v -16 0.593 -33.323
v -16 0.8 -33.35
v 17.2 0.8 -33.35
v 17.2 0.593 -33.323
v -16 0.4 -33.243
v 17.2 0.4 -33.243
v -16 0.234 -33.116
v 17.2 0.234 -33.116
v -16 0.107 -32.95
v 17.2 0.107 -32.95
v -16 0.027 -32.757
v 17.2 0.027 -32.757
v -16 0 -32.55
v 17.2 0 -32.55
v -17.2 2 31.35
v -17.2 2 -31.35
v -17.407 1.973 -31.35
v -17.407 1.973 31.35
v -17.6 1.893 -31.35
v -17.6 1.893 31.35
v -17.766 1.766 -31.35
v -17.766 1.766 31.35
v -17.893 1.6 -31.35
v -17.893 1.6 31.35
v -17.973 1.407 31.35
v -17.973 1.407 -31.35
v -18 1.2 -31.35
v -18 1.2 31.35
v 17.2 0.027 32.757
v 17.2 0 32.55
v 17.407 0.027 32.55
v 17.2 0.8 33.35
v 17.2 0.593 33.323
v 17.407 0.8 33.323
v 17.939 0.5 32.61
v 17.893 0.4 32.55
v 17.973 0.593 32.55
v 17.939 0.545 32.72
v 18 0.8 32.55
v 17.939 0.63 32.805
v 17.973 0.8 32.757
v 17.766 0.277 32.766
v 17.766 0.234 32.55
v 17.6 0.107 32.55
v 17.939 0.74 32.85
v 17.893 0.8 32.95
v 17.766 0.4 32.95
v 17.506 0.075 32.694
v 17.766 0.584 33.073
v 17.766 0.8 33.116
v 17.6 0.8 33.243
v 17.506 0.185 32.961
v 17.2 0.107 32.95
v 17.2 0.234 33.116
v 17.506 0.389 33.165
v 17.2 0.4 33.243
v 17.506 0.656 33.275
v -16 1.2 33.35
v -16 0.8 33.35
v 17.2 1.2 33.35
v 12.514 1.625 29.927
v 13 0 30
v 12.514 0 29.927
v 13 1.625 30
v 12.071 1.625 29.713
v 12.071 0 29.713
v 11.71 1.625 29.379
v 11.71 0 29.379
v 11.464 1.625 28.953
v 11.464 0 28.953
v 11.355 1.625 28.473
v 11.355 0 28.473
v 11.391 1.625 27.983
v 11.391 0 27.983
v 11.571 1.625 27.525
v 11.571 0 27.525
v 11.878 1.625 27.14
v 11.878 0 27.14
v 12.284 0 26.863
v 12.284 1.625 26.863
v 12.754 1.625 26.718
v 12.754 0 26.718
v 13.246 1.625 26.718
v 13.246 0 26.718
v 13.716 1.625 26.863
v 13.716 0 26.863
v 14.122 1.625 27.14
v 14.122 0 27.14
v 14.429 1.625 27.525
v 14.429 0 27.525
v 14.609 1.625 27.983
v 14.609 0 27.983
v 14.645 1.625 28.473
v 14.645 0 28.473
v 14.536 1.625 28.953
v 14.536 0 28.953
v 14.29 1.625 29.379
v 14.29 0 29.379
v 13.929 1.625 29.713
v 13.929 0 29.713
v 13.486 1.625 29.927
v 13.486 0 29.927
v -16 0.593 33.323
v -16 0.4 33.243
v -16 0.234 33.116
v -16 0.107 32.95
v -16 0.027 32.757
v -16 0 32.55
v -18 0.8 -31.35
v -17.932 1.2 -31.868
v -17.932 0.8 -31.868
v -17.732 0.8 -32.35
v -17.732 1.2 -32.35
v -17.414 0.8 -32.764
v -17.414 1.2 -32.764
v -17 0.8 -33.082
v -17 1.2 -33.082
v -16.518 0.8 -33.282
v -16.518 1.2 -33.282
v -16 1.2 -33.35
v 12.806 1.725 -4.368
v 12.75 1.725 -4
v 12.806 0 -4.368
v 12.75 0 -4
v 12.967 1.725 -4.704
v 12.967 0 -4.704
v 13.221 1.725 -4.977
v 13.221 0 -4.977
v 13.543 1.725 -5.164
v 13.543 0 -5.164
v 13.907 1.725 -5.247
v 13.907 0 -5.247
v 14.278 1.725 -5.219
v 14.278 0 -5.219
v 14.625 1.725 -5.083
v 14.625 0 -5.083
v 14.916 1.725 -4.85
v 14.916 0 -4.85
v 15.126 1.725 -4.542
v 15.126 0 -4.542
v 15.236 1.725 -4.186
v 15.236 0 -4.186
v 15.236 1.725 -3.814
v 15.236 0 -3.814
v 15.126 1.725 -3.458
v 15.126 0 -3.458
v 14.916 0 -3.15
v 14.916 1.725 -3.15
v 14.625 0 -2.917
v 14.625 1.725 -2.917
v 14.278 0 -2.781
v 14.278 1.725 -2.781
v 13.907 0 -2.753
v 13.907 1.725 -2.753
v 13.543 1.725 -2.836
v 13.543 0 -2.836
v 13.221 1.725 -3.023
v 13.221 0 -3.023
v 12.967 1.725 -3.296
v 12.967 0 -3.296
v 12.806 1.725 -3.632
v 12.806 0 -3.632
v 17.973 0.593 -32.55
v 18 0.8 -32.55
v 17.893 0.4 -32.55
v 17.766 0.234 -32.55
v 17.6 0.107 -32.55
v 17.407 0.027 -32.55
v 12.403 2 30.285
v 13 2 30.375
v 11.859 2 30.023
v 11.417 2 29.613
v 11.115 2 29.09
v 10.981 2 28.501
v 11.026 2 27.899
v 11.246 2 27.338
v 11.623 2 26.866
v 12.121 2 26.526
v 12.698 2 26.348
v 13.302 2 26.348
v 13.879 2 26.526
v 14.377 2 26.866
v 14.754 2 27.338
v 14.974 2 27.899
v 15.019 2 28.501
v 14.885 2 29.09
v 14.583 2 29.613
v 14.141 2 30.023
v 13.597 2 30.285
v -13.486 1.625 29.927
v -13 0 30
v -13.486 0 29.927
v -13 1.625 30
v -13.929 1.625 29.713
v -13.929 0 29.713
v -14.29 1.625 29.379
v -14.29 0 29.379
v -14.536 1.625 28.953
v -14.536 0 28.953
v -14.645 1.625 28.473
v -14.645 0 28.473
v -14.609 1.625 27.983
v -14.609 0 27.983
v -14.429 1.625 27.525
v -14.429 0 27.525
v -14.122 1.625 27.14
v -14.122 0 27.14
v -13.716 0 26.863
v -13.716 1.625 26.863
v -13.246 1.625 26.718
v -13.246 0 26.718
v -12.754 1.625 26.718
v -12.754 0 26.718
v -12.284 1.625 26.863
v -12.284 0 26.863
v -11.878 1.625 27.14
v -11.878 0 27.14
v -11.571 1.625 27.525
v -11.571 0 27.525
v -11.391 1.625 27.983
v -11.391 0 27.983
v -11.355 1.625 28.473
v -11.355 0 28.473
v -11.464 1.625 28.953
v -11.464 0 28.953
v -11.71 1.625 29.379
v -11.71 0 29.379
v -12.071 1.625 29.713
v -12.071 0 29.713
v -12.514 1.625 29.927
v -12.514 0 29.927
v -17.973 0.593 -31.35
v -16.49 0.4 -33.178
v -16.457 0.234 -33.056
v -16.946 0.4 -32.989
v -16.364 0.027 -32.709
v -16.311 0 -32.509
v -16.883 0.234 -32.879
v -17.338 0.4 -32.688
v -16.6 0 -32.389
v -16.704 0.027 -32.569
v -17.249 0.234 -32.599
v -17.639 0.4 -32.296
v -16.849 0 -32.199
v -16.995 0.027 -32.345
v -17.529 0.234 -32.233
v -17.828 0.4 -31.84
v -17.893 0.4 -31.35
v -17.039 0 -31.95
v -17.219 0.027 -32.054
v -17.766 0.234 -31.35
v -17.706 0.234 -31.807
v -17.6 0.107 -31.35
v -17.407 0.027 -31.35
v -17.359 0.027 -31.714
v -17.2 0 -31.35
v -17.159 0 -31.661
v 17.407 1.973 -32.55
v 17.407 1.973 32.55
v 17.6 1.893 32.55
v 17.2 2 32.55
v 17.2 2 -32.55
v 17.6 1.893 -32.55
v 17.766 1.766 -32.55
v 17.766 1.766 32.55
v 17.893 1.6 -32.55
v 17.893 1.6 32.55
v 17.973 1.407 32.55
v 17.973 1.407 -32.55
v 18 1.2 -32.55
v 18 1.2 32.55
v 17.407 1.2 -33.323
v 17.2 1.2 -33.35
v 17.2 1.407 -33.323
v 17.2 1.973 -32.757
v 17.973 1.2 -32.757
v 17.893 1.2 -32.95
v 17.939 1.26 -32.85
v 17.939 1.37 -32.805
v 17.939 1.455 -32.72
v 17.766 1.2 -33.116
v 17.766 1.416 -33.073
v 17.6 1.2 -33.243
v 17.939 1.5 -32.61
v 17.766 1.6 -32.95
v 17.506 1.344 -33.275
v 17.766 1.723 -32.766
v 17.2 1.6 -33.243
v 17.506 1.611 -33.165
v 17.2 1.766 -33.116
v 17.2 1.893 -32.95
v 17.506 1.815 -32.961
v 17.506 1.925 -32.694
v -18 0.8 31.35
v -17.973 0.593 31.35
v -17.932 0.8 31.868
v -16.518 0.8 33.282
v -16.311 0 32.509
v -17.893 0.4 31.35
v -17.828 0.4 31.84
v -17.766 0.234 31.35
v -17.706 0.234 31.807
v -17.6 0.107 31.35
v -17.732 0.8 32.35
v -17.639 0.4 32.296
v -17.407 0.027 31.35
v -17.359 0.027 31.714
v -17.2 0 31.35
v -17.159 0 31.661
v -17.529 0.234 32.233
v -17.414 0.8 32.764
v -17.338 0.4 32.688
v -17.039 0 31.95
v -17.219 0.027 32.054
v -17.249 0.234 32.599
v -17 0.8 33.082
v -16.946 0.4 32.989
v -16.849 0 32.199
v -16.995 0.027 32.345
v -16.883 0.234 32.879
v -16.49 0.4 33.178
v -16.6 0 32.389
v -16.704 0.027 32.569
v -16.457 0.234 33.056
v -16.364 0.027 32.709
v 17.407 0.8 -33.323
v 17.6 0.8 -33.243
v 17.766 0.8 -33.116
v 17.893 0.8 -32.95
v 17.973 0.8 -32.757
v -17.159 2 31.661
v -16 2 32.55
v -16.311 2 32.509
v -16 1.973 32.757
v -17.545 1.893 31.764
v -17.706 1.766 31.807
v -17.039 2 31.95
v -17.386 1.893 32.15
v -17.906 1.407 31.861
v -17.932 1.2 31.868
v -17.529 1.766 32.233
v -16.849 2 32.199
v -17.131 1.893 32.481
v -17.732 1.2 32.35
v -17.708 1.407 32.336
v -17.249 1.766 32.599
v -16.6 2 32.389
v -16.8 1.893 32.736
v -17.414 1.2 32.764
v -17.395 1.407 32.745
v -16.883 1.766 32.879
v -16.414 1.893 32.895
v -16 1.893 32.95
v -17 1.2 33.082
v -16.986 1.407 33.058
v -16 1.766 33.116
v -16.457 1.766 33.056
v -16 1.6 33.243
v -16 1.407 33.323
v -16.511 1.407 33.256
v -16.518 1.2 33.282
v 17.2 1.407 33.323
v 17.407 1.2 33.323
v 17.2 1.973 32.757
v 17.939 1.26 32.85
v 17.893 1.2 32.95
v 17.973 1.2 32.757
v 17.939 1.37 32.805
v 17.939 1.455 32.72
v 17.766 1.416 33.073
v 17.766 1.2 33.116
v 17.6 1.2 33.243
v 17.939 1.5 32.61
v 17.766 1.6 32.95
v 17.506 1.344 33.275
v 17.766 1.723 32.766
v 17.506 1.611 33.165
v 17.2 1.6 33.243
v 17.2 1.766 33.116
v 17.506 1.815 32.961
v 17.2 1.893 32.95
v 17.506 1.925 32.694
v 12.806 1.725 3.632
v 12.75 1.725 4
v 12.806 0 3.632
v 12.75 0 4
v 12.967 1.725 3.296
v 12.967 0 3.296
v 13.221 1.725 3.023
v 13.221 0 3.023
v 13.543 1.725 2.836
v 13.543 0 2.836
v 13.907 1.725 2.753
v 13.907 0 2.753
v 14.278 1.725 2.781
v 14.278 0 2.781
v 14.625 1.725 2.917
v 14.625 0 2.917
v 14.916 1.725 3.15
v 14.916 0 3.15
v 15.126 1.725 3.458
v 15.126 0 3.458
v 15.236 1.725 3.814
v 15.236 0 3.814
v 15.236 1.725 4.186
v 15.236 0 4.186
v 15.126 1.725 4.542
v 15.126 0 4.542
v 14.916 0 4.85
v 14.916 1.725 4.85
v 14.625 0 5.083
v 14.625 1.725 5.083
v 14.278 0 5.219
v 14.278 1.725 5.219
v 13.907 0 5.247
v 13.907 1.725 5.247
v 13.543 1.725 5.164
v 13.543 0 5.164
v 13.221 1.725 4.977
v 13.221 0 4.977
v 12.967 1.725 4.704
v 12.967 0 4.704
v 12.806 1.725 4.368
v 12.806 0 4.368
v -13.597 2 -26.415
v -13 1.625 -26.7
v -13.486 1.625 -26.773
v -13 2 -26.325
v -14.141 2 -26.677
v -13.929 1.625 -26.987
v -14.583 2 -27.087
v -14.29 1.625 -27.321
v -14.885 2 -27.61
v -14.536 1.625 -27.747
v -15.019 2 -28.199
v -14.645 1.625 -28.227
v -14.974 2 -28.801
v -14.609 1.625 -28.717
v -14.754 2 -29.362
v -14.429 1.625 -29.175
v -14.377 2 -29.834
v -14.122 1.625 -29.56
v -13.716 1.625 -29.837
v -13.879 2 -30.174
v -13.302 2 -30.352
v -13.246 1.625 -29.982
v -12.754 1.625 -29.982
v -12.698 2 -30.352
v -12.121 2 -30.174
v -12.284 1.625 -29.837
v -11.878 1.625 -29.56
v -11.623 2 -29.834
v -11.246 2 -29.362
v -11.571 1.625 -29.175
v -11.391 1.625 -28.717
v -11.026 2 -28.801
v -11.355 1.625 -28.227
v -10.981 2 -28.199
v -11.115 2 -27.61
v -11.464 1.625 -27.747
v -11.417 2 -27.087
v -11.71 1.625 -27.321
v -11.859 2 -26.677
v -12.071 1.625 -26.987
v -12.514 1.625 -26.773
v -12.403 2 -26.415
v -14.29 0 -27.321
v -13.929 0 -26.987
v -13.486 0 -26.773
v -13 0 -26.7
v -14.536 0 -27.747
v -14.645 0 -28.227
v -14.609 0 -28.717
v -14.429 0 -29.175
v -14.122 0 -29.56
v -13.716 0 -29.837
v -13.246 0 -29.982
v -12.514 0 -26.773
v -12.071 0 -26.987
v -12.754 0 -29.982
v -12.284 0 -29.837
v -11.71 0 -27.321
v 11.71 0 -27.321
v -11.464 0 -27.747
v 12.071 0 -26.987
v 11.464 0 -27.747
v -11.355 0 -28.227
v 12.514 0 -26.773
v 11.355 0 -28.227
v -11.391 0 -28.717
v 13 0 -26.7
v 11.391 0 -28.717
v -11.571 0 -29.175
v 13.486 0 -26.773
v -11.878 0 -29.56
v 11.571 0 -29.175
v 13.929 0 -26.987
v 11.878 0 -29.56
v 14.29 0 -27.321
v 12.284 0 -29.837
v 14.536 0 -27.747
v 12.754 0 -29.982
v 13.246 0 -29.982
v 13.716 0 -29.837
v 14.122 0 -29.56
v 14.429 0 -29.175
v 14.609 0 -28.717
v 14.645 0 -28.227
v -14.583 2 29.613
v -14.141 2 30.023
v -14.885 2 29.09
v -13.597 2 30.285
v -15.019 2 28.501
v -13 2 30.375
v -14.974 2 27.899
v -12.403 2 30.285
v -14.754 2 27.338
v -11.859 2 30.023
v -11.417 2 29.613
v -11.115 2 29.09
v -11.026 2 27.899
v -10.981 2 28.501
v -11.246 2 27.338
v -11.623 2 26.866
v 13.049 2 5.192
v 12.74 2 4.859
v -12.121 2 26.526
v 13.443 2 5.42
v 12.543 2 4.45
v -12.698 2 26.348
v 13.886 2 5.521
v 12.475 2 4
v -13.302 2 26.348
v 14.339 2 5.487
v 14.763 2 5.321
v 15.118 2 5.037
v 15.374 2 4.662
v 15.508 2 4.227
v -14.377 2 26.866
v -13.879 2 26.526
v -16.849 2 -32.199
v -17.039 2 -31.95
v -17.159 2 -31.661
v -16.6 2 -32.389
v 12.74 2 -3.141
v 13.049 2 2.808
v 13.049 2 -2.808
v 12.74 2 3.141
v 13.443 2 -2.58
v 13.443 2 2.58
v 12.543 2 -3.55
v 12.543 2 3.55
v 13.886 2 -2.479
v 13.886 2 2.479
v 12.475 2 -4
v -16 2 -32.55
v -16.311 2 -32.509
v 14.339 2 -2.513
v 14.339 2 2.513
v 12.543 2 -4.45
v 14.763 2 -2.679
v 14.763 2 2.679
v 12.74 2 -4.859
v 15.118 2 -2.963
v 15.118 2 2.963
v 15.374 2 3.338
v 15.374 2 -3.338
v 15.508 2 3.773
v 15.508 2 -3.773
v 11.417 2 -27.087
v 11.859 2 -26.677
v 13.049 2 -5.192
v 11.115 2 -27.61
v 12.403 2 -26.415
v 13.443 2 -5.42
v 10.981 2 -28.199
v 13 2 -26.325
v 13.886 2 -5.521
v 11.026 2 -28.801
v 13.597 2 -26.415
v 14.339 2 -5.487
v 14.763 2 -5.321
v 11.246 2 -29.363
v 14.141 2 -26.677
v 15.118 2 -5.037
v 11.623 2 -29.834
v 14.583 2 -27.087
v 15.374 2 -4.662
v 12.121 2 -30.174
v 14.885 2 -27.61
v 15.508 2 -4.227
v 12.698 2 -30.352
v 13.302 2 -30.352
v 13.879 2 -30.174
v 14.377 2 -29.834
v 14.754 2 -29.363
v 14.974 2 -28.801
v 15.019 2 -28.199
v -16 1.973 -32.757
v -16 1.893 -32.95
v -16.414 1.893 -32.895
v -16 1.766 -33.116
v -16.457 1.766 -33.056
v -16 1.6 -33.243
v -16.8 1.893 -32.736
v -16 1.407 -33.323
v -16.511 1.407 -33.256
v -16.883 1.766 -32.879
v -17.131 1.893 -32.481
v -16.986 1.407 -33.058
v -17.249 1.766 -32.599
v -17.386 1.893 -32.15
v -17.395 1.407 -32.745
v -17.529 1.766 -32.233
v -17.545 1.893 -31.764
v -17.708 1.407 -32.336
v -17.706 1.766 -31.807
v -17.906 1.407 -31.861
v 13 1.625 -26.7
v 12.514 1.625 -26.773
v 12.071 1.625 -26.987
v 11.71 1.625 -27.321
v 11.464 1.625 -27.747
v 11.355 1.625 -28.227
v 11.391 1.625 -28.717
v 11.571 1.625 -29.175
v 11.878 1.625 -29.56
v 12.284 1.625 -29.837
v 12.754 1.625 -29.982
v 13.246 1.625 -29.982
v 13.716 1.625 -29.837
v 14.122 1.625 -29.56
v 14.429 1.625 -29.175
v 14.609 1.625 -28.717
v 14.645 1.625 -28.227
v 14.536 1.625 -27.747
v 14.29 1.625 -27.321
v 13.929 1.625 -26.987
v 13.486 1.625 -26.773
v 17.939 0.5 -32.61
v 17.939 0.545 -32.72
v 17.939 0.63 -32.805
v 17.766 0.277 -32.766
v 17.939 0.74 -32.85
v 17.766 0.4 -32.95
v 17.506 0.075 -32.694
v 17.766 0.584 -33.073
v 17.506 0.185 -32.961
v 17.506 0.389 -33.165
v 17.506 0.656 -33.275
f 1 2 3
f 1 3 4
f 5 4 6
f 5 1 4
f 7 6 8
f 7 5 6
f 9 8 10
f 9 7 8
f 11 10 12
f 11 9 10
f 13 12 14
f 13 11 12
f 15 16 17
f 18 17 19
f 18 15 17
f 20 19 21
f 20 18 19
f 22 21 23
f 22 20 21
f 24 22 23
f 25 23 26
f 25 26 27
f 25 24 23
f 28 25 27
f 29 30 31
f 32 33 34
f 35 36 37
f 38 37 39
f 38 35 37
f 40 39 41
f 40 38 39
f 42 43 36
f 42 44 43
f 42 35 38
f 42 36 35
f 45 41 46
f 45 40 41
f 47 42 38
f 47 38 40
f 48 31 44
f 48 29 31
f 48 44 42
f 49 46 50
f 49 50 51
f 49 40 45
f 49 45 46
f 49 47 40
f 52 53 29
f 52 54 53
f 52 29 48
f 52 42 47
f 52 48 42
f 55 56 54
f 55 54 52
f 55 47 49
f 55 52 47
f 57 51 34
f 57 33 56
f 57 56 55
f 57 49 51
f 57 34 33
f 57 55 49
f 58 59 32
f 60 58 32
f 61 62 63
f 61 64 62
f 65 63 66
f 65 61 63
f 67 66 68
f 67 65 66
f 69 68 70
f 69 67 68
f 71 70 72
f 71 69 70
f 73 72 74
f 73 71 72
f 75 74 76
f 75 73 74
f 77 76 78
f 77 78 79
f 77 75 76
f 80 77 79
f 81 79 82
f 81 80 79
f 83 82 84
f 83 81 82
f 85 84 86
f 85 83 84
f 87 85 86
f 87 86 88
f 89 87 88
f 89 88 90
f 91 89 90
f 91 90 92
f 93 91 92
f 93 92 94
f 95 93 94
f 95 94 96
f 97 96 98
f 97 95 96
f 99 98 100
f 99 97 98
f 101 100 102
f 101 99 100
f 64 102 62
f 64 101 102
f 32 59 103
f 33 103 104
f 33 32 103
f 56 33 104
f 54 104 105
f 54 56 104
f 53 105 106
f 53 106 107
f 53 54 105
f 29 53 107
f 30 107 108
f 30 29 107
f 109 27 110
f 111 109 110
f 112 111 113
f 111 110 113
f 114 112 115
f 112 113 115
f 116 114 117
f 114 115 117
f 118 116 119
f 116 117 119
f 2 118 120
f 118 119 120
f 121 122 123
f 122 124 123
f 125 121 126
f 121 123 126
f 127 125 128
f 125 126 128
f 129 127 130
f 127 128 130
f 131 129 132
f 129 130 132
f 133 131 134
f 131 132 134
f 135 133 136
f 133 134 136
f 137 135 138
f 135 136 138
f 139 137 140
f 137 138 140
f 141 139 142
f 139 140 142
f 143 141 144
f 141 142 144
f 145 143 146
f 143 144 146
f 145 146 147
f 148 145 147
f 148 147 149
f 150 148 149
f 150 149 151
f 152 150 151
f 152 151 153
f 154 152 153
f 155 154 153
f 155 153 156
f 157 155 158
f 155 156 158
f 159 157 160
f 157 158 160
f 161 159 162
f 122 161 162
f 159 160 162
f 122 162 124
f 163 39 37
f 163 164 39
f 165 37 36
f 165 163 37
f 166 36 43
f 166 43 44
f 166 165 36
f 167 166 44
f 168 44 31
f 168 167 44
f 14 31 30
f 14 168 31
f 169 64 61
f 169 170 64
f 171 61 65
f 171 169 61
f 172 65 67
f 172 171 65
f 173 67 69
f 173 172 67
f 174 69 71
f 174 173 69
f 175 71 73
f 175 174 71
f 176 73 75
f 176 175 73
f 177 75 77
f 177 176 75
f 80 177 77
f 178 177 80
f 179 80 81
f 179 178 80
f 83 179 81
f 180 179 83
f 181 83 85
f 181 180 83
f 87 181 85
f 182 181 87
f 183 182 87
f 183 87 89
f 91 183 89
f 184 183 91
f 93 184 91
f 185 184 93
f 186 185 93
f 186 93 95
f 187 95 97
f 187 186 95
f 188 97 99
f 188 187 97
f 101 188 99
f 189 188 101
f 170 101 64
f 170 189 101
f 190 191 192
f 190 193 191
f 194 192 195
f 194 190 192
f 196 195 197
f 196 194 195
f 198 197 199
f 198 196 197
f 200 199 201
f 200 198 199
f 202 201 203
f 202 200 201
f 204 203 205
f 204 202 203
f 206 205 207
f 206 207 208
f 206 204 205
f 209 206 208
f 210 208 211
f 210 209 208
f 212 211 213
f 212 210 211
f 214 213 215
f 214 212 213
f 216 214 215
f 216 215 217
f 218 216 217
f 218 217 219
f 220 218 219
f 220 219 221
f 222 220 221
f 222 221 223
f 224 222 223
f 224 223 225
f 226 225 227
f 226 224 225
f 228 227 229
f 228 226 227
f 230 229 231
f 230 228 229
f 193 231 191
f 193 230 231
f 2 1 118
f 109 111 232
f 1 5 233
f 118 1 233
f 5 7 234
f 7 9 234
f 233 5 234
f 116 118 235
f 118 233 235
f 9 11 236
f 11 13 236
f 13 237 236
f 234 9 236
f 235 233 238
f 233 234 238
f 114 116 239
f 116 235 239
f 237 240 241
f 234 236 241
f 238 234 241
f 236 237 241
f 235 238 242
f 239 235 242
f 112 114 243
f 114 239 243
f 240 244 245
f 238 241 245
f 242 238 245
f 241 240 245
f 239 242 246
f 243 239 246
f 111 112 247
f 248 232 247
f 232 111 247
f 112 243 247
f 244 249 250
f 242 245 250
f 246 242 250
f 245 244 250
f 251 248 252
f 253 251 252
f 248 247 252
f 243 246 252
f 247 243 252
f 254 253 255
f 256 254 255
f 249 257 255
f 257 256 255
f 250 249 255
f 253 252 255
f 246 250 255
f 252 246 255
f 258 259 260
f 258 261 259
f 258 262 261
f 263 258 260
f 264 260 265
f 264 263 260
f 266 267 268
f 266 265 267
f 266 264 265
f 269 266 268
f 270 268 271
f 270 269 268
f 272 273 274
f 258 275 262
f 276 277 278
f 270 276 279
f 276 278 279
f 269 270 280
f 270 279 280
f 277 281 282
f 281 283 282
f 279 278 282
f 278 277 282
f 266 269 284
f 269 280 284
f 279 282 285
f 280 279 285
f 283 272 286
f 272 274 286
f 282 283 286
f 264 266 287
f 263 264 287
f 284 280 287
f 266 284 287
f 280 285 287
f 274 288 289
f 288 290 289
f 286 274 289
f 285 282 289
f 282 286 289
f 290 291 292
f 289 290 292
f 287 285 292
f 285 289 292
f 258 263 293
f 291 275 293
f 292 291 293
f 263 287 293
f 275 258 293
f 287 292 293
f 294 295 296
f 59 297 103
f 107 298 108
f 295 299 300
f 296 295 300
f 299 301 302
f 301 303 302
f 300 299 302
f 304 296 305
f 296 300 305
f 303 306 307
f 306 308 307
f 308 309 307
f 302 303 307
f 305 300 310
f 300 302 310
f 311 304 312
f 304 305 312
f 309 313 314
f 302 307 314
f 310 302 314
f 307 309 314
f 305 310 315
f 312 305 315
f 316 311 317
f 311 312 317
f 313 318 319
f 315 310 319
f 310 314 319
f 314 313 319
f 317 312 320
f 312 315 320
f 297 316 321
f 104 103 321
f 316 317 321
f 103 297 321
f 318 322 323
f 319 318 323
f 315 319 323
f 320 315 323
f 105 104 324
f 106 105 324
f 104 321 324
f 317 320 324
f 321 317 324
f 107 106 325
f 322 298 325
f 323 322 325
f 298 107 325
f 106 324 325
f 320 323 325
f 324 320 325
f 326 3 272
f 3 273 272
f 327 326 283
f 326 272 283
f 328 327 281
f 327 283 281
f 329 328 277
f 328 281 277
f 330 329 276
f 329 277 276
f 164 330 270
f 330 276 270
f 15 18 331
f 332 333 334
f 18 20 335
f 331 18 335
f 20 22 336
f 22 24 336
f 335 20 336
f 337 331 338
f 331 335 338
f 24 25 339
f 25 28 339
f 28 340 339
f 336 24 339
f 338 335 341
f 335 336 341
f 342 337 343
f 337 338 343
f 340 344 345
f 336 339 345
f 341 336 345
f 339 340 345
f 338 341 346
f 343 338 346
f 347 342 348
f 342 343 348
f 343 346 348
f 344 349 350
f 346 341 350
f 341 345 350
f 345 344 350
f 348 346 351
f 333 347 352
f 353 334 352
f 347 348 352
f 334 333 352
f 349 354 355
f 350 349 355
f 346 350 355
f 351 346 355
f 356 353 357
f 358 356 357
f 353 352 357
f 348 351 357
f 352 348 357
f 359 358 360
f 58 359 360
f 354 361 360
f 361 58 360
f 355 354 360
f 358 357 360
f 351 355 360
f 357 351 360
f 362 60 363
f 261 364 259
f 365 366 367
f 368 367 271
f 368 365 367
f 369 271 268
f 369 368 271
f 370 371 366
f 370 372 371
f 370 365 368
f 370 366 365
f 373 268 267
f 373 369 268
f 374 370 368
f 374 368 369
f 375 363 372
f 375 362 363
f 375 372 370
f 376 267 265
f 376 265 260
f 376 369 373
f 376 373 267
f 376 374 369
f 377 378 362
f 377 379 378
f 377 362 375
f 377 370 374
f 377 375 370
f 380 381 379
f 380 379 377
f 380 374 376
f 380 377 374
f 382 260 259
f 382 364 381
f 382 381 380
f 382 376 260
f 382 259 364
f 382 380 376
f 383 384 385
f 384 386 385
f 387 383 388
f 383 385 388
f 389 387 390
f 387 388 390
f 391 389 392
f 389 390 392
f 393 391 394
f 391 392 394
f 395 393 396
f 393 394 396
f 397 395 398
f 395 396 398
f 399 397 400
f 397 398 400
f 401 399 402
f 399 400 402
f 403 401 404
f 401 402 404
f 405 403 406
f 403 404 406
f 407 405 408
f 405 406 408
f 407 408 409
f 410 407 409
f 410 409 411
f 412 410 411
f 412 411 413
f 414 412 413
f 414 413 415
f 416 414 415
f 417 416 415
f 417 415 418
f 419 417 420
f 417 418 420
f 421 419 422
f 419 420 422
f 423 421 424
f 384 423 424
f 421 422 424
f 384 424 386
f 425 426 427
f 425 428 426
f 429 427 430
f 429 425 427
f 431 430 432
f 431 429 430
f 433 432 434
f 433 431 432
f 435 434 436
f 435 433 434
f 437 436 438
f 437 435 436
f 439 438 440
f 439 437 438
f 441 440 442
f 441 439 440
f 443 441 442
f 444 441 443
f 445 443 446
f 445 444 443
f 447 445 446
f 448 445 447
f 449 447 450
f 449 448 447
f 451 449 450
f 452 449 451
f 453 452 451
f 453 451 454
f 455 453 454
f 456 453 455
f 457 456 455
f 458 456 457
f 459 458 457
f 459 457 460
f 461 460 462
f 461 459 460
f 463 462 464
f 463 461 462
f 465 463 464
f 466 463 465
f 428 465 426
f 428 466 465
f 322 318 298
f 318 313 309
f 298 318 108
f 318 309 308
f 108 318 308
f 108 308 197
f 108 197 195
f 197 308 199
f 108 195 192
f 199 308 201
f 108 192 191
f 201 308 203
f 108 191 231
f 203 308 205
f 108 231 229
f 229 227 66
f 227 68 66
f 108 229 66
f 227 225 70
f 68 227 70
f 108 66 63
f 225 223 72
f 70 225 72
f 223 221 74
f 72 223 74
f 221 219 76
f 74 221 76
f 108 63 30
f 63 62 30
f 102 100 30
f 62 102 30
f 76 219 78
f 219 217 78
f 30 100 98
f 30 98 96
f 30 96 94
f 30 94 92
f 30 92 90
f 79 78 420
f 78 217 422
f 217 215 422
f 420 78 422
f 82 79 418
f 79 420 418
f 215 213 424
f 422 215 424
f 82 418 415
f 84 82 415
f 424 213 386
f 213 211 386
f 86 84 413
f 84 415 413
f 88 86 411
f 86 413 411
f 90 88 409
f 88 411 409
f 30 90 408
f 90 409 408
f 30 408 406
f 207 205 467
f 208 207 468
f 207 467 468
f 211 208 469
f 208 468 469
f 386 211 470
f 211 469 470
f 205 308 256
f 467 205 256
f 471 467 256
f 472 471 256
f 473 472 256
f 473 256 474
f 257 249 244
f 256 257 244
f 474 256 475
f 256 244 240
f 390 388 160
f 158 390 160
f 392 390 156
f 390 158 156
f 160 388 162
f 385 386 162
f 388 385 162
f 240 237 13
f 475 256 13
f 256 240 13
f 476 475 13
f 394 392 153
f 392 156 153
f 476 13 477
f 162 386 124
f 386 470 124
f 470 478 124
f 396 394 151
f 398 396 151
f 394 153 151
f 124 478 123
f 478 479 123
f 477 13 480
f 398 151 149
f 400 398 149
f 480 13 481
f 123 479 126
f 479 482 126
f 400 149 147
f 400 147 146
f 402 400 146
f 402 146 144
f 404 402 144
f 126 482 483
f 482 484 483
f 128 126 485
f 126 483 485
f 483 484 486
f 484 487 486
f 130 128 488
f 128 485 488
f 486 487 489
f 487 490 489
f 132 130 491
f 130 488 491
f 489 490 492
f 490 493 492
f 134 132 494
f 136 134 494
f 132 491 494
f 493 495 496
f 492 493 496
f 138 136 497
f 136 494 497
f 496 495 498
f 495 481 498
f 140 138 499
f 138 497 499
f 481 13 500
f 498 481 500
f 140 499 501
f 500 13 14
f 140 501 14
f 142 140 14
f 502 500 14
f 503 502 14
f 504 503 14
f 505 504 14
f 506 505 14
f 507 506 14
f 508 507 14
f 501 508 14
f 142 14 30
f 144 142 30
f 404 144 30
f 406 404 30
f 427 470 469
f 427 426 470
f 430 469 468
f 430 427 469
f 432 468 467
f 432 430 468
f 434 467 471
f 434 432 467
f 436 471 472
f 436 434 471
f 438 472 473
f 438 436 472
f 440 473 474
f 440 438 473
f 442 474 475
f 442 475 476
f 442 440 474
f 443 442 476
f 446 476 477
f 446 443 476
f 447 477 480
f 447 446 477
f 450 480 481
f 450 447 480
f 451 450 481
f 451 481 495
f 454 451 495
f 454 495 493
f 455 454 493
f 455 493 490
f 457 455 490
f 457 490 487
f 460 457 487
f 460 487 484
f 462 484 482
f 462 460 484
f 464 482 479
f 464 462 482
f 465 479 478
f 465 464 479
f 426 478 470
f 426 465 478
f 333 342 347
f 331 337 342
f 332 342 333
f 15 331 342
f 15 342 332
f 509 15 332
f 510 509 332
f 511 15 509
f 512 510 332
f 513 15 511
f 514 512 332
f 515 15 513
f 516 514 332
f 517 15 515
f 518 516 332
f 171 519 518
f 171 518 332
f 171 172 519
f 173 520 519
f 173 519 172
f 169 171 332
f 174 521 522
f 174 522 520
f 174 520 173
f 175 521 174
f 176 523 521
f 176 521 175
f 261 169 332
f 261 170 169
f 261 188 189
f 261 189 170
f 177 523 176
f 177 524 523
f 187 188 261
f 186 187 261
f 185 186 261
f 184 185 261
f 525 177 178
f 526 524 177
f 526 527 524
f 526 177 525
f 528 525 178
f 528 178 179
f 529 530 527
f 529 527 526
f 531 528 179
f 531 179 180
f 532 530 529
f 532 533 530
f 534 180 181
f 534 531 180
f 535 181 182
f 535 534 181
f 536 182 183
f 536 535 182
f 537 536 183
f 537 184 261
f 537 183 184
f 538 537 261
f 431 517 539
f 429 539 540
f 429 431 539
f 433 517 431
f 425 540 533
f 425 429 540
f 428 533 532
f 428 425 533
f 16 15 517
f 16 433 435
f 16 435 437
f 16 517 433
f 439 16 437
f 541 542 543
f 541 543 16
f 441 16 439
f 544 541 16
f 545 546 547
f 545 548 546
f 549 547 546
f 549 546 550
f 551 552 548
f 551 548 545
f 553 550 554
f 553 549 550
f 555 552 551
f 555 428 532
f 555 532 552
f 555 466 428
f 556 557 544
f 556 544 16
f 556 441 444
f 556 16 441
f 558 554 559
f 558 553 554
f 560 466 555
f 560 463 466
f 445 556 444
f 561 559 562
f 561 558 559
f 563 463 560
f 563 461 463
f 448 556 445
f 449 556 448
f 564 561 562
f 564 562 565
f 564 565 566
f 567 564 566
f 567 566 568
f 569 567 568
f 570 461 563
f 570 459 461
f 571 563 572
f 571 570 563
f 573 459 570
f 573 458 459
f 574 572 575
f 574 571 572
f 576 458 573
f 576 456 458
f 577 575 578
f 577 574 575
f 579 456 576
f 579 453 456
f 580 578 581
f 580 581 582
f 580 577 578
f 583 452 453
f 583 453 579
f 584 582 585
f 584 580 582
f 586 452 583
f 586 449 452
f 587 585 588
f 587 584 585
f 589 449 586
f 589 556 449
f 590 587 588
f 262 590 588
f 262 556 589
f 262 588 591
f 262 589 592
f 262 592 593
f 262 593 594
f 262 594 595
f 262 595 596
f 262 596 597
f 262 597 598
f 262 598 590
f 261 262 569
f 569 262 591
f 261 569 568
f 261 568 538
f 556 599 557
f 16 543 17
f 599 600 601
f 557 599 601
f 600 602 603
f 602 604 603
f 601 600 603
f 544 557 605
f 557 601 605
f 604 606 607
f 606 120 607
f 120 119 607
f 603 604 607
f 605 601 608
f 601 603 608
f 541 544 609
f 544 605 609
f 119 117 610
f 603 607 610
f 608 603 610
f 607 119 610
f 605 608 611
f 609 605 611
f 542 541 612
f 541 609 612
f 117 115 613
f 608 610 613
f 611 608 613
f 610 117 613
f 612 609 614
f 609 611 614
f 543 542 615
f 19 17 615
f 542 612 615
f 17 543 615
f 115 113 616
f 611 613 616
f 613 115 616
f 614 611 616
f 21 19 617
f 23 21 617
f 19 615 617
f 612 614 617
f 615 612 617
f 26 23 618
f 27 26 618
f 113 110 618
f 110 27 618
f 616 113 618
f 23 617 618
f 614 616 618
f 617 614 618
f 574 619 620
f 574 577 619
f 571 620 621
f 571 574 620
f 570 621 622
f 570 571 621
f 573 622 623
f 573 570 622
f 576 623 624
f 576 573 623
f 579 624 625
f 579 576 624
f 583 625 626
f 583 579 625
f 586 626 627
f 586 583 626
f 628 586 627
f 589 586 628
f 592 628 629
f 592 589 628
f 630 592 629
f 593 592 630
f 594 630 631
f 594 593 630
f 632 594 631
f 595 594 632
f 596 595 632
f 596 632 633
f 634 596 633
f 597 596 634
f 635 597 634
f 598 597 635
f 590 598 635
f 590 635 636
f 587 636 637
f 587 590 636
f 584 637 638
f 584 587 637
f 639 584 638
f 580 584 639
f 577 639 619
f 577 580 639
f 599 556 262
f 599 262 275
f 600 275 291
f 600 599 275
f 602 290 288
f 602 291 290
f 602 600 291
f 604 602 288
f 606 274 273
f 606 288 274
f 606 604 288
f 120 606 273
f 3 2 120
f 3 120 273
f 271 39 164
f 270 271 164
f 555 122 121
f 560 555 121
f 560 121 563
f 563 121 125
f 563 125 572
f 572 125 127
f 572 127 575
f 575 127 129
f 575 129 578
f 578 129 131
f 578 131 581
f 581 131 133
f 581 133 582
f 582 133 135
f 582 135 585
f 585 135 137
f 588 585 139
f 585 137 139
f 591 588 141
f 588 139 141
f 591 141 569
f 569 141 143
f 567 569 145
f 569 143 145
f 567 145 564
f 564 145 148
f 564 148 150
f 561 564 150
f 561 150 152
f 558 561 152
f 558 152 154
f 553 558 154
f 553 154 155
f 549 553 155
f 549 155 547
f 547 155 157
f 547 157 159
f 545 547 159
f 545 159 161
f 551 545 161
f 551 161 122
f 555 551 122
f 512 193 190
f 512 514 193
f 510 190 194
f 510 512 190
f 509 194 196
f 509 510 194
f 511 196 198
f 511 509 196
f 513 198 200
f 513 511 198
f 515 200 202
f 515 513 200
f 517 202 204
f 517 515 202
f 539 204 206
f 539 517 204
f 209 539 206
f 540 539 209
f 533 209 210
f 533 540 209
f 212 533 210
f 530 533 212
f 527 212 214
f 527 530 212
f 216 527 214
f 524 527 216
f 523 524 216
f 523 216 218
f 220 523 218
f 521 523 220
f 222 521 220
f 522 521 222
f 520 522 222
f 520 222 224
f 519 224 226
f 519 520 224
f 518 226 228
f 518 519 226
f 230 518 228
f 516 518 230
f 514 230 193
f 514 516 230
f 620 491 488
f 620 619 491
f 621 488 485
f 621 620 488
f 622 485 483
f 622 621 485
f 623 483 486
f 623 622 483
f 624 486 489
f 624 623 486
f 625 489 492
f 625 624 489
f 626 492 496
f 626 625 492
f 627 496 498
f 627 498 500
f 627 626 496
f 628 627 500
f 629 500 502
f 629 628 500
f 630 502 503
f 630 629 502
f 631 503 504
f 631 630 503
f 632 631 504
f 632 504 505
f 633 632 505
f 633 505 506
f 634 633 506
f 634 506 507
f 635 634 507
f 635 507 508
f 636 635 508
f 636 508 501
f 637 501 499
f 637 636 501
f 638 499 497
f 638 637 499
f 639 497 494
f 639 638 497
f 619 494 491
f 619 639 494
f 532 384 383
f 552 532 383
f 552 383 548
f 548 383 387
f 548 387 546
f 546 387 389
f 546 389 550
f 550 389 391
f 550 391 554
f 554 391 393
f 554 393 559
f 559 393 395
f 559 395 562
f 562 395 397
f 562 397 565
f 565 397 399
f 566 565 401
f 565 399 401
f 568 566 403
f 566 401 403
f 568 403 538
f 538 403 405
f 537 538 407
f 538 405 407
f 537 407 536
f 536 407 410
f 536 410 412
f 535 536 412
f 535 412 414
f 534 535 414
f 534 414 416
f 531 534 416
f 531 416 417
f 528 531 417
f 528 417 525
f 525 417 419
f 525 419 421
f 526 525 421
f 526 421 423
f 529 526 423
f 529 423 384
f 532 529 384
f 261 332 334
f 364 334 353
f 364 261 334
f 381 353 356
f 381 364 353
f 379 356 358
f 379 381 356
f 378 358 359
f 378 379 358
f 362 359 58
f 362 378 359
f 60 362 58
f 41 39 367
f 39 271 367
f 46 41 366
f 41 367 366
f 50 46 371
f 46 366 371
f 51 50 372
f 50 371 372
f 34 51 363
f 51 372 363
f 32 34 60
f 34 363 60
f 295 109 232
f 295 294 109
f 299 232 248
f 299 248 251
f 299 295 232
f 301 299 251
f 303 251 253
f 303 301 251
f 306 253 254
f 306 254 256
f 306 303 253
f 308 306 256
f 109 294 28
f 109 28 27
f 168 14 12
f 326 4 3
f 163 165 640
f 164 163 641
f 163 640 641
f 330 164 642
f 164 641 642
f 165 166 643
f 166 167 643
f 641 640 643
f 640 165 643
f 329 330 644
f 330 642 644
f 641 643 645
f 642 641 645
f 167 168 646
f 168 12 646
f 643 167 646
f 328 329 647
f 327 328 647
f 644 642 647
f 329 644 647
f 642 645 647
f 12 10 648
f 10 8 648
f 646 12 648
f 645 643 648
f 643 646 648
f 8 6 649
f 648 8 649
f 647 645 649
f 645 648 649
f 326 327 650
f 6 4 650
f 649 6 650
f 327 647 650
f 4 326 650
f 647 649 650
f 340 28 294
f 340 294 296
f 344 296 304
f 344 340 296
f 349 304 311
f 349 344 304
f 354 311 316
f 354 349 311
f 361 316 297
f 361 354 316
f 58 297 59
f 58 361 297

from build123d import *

# Parameters (mm, degrees)
SKETCH_1_W                   = 36
SKETCH_1_H                   = 66.7
EXTRUDE_1_DEPTH              = 2
HOLE_WIZARD_M4_2_AT_2_COUNT  = 2
HOLE_WIZARD_M4_2_AT_2_PITCH  = 56.7
HOLE_WIZARD_M4_2_AT_3_COUNT  = 2
HOLE_WIZARD_M4_2_AT_3_PITCH  = 62.376998966
HOLE_WIZARD_M4_2_AT_4_COUNT  = 2
HOLE_WIZARD_M4_2_AT_4_PITCH  = 26
FILLET_1_R                   = 2
HOLE_WIZARD_M3_1_D           = 2.5
HOLE_WIZARD_M3_1_CSINK_D     = 3.05
HOLE_WIZARD_M3_1_CSINK_ANGLE = 90
FILLET_2_R                   = 0.8


with BuildPart() as part:
    # 草图1 → 凸台-拉伸1 (new body)
    with BuildSketch(Plane(origin=(0, 0, 0), x_dir=(1, 0, 0), z_dir=(0, 1, 0))):
        Rectangle(SKETCH_1_W, SKETCH_1_H)
    extrude(amount=EXTRUDE_1_DEPTH)

    # 草图4 → M4 螺纹孔2 (revolve, cut)
    with BuildSketch(Plane(origin=(-13, 2, 28.35), x_dir=(0, 0, 1), z_dir=(1, 0, 0))):
        Polygon((0, 0), (0, 2), (1.65, 2), (1.65, 0.375), (2.025, 0), align=None)
    hole_wizard_m4_2 = revolve(axis=Axis((-13, 8.35, 28.35), (0, -1, 0)), mode=Mode.SUBTRACT)

    # M4 螺纹孔2 at 2: M4 螺纹孔2 ×2
    with Locations(*[(0, 0, -i * HOLE_WIZARD_M4_2_AT_2_PITCH) for i in range(1, HOLE_WIZARD_M4_2_AT_2_COUNT)]):
        add(hole_wizard_m4_2, mode=Mode.SUBTRACT)

    # M4 螺纹孔2 at 3: M4 螺纹孔2 ×2
    with Locations(*[Vector(0.41682030926474145, 0, -0.9089889052042635) * (i * HOLE_WIZARD_M4_2_AT_3_PITCH) for i in range(1, HOLE_WIZARD_M4_2_AT_3_COUNT)]):
        add(hole_wizard_m4_2, mode=Mode.SUBTRACT)

    # M4 螺纹孔2 at 4: M4 螺纹孔2 ×2
    with Locations(*[(i * HOLE_WIZARD_M4_2_AT_4_PITCH, 0, 0) for i in range(1, HOLE_WIZARD_M4_2_AT_4_COUNT)]):
        add(hole_wizard_m4_2, mode=Mode.SUBTRACT)

    # 圆角1
    fillet_1_edges = [part.edges().sort_by_distance(p)[0] for p in [
        (-18, 1, 33.35),
        (-18, 1, -33.35),
    ]]
    fillet(fillet_1_edges, radius=FILLET_1_R)

    # M3 螺纹孔1 (through all)
    with Locations(Plane(origin=(0, 2, 0), x_dir=(1, 0, 0), z_dir=(0, 1, 0))):
        with Locations((14, -4), (14, 4)):
            CounterSinkHole(HOLE_WIZARD_M3_1_D / 2, HOLE_WIZARD_M3_1_CSINK_D / 2, counter_sink_angle=HOLE_WIZARD_M3_1_CSINK_ANGLE)

    # 圆角2
    fillet_2_edges = [part.edges().sort_by_distance(p)[0] for p in [
        (1, 0, 33.35),
        (1, 2, 33.35),
        (-18, 0, 0),
        (1, 0, -33.35),
        (-17.414213562, 0, -32.764213562),
        (-17.414213562, 0, 32.764213562),
        (-18, 2, 0),
        (1, 2, -33.35),
        (-17.414213562, 2, -32.764213562),
        (-17.414213562, 2, 32.764213562),
        (18, 0, 0),
        (18, 1, -33.35),
        (18, 1, 33.35),
        (18, 2, 0),
    ]]
    fillet(fillet_2_edges, radius=FILLET_2_R)


solid = part.part
